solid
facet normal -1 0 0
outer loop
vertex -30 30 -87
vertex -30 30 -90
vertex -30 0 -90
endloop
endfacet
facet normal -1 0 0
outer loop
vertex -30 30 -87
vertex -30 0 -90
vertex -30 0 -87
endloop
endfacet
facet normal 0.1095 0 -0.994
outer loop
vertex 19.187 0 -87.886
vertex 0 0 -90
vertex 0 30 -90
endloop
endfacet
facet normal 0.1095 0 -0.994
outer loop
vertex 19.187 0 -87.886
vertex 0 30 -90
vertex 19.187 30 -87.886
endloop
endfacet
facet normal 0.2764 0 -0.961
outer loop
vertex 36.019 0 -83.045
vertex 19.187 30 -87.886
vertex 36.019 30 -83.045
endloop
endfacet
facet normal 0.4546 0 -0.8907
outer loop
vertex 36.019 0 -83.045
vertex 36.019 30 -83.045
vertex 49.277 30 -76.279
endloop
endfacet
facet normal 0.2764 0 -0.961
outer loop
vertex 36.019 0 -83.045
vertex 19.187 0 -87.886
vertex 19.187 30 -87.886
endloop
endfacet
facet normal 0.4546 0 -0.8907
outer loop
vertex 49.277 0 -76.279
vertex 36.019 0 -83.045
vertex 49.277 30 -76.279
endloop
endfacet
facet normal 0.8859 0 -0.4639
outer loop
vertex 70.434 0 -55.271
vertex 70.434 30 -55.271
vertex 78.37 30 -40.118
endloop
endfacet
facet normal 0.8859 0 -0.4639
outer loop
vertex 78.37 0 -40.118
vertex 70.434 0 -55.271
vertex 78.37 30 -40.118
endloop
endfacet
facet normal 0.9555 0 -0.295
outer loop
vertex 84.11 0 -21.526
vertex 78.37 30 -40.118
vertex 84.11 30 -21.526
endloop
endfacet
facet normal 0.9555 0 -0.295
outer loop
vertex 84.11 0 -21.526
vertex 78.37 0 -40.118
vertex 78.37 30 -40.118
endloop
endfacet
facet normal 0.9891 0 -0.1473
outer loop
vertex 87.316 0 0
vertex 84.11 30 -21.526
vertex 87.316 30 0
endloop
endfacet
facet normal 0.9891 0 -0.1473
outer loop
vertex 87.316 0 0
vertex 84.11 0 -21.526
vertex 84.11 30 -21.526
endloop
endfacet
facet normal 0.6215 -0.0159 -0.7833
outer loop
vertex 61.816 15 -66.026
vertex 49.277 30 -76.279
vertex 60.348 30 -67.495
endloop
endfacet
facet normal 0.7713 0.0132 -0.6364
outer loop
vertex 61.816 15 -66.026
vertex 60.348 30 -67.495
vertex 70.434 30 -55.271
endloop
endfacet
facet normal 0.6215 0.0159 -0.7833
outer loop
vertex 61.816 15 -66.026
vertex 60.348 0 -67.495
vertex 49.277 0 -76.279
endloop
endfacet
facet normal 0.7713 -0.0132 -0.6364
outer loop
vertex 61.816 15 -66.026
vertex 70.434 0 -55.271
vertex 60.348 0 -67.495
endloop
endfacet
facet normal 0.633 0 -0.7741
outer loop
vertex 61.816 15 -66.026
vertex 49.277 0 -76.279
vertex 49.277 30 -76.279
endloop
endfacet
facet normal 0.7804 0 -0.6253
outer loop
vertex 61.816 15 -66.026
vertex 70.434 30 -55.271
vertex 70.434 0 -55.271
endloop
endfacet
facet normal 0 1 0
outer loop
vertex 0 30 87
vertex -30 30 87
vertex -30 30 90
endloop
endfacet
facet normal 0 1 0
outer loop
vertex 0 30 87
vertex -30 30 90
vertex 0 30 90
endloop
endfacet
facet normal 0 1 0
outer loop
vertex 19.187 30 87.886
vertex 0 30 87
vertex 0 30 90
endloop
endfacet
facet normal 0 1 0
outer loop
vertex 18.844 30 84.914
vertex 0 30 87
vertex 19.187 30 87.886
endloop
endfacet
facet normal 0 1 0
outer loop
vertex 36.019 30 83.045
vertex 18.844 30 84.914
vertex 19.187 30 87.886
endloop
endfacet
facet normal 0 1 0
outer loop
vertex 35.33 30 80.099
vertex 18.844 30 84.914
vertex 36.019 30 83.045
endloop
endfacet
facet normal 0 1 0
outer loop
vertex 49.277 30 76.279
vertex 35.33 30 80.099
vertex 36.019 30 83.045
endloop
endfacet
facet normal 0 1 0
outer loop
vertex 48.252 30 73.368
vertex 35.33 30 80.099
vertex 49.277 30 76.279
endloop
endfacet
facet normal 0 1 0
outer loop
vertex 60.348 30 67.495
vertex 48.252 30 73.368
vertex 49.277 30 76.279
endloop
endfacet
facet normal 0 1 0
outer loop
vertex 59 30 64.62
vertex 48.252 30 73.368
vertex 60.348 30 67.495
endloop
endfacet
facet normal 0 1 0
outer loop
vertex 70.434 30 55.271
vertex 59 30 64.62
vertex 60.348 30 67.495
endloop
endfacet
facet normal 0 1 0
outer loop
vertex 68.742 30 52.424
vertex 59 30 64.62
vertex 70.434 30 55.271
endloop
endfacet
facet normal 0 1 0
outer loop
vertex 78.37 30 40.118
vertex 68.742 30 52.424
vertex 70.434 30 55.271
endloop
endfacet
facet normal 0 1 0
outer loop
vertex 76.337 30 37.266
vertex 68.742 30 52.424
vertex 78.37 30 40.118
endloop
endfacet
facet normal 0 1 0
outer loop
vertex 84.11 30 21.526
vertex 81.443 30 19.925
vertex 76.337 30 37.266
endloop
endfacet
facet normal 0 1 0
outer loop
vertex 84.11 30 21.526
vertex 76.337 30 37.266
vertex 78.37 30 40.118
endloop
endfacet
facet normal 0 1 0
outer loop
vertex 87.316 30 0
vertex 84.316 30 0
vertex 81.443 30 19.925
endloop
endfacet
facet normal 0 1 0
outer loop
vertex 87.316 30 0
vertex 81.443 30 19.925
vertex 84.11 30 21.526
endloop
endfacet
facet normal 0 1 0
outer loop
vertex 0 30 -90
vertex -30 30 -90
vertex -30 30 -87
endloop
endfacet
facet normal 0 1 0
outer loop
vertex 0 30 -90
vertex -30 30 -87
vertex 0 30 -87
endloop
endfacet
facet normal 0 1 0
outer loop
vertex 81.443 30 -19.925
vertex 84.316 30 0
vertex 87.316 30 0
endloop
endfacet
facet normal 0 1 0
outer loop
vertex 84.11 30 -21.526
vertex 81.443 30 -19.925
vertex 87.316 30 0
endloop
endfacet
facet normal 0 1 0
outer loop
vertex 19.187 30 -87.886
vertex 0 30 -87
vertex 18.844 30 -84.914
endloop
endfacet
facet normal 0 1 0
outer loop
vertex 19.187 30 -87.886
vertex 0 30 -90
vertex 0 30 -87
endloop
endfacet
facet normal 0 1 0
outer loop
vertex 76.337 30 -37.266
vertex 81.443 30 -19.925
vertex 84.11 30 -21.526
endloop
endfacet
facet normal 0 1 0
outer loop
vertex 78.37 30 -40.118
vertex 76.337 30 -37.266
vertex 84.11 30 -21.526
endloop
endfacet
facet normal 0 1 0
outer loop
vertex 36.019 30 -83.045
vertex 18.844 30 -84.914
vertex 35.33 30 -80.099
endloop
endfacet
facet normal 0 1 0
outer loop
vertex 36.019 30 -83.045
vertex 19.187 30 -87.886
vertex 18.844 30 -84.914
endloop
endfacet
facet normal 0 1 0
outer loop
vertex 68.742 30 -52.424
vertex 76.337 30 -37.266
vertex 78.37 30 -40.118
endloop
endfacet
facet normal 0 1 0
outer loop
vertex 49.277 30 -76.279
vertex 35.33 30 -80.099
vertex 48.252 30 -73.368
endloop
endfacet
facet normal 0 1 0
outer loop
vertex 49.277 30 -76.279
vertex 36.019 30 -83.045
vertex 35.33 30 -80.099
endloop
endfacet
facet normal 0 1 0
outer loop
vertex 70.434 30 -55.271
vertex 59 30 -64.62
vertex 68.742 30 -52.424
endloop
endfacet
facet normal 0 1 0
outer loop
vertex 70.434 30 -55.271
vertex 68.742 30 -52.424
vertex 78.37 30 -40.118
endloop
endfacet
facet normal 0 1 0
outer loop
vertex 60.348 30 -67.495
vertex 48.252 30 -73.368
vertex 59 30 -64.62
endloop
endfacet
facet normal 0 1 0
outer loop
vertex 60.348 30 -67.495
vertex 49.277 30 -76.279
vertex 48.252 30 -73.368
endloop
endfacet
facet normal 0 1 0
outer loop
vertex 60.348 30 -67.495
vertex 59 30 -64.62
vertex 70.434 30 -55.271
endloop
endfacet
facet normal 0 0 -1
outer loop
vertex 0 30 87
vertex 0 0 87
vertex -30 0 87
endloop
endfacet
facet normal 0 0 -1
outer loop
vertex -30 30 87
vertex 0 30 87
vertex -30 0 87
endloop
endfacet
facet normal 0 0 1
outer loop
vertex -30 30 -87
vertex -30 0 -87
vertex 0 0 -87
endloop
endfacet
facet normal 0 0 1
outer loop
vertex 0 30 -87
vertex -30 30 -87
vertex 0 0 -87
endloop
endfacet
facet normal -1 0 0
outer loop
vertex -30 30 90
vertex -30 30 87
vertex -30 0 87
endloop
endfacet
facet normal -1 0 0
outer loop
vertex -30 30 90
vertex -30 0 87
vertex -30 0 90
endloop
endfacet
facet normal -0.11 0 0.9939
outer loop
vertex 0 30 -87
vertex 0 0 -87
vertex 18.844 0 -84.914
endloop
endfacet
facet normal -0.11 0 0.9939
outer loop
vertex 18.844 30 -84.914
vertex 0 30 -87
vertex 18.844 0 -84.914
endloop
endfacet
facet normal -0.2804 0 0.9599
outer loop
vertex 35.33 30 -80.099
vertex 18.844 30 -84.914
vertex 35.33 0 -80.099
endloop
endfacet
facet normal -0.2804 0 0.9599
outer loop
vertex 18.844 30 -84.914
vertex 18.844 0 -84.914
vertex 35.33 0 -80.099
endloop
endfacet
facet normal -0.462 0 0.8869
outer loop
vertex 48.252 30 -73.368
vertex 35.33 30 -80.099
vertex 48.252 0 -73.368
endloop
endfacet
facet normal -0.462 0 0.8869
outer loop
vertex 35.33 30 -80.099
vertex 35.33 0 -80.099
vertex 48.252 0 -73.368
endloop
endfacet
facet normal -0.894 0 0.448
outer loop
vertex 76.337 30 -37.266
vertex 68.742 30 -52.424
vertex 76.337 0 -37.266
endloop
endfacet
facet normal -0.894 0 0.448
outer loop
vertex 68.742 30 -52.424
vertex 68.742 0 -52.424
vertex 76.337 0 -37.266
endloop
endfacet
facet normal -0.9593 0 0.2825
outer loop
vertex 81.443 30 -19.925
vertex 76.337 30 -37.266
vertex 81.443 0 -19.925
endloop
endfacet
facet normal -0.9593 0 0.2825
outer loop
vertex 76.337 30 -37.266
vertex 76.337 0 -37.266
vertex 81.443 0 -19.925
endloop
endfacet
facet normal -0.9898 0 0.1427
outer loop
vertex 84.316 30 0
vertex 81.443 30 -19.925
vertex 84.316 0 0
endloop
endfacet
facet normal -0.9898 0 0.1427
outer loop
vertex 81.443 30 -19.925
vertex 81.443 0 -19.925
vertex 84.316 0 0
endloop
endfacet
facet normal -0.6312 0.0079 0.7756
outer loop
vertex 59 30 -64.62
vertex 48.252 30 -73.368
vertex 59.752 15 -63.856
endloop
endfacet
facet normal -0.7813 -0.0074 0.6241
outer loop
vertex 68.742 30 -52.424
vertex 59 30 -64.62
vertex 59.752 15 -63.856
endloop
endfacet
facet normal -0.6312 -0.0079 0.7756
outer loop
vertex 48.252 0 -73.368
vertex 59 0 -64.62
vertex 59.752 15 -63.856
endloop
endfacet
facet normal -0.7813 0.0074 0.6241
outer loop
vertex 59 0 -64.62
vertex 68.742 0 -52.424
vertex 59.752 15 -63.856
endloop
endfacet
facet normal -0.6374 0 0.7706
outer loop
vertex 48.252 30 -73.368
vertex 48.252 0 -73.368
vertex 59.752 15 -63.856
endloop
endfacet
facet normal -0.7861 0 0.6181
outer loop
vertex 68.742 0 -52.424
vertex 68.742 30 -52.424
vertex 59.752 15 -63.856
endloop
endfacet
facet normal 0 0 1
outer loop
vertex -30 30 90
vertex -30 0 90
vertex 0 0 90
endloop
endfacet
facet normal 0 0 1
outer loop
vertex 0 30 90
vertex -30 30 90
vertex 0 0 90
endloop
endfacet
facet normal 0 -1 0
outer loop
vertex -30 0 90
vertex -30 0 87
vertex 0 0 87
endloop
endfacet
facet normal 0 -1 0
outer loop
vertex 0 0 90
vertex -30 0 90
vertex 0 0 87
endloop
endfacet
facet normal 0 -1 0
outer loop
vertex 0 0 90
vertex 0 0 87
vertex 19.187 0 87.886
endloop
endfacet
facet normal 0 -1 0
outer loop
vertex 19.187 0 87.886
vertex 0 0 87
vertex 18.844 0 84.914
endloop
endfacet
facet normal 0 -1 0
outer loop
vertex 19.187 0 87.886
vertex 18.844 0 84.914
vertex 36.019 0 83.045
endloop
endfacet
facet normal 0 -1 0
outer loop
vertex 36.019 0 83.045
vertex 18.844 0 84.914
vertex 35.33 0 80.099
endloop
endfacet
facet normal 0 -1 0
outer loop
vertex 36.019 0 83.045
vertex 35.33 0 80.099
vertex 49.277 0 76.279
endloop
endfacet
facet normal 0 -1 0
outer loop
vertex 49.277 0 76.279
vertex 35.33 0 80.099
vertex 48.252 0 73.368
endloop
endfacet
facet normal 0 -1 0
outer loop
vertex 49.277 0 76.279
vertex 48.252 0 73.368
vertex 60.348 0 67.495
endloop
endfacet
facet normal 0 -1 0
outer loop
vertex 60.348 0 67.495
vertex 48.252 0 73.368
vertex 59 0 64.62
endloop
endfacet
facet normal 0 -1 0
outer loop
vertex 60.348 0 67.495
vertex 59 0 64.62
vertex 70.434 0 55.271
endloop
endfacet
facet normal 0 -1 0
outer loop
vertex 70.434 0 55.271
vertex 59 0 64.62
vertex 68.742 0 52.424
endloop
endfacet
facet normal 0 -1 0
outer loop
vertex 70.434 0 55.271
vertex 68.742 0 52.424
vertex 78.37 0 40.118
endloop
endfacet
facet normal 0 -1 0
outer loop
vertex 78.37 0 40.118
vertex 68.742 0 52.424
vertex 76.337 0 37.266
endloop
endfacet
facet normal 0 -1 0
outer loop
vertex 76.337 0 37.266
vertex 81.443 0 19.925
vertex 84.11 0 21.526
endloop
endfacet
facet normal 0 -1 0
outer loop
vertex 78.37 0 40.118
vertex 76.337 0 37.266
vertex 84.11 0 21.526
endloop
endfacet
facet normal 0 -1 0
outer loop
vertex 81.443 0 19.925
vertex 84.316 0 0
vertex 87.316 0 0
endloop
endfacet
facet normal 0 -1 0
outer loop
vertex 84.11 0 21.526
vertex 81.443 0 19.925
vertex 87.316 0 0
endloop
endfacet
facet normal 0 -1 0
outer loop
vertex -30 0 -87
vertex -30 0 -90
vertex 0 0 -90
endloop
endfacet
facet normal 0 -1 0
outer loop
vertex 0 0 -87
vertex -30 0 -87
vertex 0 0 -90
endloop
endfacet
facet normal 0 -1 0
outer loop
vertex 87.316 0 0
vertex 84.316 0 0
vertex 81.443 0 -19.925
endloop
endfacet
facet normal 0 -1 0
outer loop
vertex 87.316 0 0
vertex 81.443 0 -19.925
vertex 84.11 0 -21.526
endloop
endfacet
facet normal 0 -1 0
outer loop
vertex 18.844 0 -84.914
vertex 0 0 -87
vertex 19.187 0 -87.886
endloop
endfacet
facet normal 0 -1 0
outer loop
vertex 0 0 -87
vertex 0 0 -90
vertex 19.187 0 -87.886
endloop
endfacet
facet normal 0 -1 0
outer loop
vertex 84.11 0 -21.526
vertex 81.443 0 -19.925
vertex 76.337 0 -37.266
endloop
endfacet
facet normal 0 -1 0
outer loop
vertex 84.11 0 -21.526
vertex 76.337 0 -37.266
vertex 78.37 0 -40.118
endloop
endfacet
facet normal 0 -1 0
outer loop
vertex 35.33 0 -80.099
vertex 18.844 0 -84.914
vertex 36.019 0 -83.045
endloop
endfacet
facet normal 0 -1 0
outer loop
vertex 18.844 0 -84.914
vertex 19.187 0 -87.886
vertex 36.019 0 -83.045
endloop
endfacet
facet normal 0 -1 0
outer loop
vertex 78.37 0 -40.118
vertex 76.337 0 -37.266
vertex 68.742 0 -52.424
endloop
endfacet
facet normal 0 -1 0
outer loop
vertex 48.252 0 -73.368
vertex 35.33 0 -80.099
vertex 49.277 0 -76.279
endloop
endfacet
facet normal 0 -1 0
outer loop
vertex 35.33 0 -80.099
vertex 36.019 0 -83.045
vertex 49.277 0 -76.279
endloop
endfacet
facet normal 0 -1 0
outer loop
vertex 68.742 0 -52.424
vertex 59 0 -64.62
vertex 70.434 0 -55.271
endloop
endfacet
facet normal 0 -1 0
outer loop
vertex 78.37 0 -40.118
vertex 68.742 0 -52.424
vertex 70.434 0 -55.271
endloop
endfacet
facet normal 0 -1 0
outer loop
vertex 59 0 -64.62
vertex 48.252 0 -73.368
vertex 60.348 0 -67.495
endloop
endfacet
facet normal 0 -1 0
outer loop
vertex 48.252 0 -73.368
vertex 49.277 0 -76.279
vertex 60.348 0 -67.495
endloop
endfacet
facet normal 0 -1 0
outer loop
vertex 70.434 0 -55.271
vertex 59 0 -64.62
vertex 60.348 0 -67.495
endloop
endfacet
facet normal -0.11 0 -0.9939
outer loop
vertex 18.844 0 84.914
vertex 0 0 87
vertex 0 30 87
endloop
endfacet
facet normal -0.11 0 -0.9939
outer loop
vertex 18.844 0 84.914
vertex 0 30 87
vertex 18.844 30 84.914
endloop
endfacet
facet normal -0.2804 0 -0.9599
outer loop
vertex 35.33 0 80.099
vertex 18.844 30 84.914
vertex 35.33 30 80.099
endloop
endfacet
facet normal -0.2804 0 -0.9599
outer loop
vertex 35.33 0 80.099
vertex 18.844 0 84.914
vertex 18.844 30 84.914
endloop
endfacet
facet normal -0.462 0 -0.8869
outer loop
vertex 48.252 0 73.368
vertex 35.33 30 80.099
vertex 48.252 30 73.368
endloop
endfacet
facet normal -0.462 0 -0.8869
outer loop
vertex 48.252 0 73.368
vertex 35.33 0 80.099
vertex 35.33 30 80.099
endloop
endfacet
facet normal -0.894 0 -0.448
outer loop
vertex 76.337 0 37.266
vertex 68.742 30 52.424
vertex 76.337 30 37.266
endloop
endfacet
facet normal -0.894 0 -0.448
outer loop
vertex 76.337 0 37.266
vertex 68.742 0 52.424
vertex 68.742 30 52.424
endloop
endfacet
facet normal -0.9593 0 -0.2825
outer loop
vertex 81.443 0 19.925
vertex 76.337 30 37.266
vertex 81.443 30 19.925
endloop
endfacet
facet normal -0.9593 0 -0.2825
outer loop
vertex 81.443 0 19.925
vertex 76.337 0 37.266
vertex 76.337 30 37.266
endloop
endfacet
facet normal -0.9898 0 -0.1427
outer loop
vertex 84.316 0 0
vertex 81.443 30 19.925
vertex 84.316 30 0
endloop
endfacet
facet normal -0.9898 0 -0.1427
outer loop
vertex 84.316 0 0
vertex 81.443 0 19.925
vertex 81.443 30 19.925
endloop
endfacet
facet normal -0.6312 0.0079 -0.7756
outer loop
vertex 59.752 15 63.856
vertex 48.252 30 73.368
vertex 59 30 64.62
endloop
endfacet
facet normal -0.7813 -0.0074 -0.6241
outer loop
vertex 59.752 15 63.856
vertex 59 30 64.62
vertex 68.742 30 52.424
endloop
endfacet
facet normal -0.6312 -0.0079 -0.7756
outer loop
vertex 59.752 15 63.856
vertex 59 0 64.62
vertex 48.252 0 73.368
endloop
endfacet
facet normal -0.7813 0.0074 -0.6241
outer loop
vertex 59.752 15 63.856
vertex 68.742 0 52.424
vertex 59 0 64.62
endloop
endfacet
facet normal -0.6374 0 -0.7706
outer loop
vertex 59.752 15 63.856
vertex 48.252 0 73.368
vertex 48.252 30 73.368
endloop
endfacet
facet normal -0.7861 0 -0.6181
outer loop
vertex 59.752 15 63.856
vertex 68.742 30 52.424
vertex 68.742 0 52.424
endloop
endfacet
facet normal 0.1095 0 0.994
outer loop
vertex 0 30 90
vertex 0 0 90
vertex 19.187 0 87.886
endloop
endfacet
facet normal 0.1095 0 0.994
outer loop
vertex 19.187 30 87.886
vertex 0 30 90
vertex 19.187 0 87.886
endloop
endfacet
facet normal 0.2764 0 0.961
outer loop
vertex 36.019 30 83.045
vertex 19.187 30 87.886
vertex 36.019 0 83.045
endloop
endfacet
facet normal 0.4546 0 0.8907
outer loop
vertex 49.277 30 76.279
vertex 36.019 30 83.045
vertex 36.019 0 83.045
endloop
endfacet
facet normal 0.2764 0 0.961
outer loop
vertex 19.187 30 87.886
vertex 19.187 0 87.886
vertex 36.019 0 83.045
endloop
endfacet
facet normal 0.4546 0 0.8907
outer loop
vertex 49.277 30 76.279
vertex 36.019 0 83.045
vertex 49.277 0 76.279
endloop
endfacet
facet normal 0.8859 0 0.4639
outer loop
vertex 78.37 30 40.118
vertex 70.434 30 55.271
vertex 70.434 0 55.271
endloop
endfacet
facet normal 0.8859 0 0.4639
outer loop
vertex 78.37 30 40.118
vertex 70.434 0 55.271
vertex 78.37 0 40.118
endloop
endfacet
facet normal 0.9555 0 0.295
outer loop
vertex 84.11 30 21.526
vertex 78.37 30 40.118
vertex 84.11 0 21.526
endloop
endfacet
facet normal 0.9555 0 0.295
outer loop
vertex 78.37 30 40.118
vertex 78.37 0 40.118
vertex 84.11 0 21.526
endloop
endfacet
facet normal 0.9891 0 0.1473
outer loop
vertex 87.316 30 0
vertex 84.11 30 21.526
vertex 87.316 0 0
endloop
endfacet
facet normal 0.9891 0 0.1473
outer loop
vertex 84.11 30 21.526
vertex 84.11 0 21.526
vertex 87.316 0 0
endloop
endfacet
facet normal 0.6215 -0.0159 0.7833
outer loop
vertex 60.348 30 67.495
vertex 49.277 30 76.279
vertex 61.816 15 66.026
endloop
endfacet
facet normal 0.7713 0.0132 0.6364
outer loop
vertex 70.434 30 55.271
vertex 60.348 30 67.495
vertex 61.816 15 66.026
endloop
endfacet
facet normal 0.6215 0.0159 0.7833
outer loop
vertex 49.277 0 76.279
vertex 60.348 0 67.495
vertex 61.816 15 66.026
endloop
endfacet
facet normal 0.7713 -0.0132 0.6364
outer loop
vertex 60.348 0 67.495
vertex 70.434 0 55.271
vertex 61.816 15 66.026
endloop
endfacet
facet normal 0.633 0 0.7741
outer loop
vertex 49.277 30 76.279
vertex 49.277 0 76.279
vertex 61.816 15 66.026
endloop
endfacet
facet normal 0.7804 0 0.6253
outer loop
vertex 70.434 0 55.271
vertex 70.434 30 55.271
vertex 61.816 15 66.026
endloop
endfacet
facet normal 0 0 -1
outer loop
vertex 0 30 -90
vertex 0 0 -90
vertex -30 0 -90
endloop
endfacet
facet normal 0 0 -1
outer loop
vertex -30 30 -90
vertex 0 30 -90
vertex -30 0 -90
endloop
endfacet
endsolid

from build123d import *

# Parameters (mm, degrees)
BOSS_EXTRUDE1_DEPTH = 30


with BuildPart() as part:
    # Sketch2 → Boss-Extrude1 (new body)
    with BuildSketch(Plane(origin=(0, 0, 0), x_dir=(1, 0, 0), z_dir=(0, 1, 0))):
        with BuildLine():
            Line((0, 90), (-30, 90))
            Line((-30, 90), (-30, 87))
            Line((-30, 87), (0, 87))
            add(Edge.make_bspline(
                [(0, 87), (77.34675255, 84.211391956), (84.31600038, 0)],
                knots=[0, 0, 0, 1, 1, 1], degree=2))
            add(Edge.make_bspline(
                [(0, -87), (77.34675255, -84.211391956), (84.31600038, 0)],
                knots=[0, 0, 0, 1, 1, 1], degree=2))
            Line((0, -87), (-30, -87))
            Line((-30, -87), (-30, -90))
            Line((-30, -90), (0, -90))
            add(Edge.make_bspline(
                [(0, -90), (79.973883015, -87.051000651), (87.31600038, 0)],
                knots=[0, 0, 0, 1, 1, 1], degree=2))
            add(Edge.make_bspline(
                [(0, 90), (79.973883015, 87.051000651), (87.31600038, 0)],
                knots=[0, 0, 0, 1, 1, 1], degree=2))
        make_face()
    extrude(amount=BOSS_EXTRUDE1_DEPTH)


solid = part.part
